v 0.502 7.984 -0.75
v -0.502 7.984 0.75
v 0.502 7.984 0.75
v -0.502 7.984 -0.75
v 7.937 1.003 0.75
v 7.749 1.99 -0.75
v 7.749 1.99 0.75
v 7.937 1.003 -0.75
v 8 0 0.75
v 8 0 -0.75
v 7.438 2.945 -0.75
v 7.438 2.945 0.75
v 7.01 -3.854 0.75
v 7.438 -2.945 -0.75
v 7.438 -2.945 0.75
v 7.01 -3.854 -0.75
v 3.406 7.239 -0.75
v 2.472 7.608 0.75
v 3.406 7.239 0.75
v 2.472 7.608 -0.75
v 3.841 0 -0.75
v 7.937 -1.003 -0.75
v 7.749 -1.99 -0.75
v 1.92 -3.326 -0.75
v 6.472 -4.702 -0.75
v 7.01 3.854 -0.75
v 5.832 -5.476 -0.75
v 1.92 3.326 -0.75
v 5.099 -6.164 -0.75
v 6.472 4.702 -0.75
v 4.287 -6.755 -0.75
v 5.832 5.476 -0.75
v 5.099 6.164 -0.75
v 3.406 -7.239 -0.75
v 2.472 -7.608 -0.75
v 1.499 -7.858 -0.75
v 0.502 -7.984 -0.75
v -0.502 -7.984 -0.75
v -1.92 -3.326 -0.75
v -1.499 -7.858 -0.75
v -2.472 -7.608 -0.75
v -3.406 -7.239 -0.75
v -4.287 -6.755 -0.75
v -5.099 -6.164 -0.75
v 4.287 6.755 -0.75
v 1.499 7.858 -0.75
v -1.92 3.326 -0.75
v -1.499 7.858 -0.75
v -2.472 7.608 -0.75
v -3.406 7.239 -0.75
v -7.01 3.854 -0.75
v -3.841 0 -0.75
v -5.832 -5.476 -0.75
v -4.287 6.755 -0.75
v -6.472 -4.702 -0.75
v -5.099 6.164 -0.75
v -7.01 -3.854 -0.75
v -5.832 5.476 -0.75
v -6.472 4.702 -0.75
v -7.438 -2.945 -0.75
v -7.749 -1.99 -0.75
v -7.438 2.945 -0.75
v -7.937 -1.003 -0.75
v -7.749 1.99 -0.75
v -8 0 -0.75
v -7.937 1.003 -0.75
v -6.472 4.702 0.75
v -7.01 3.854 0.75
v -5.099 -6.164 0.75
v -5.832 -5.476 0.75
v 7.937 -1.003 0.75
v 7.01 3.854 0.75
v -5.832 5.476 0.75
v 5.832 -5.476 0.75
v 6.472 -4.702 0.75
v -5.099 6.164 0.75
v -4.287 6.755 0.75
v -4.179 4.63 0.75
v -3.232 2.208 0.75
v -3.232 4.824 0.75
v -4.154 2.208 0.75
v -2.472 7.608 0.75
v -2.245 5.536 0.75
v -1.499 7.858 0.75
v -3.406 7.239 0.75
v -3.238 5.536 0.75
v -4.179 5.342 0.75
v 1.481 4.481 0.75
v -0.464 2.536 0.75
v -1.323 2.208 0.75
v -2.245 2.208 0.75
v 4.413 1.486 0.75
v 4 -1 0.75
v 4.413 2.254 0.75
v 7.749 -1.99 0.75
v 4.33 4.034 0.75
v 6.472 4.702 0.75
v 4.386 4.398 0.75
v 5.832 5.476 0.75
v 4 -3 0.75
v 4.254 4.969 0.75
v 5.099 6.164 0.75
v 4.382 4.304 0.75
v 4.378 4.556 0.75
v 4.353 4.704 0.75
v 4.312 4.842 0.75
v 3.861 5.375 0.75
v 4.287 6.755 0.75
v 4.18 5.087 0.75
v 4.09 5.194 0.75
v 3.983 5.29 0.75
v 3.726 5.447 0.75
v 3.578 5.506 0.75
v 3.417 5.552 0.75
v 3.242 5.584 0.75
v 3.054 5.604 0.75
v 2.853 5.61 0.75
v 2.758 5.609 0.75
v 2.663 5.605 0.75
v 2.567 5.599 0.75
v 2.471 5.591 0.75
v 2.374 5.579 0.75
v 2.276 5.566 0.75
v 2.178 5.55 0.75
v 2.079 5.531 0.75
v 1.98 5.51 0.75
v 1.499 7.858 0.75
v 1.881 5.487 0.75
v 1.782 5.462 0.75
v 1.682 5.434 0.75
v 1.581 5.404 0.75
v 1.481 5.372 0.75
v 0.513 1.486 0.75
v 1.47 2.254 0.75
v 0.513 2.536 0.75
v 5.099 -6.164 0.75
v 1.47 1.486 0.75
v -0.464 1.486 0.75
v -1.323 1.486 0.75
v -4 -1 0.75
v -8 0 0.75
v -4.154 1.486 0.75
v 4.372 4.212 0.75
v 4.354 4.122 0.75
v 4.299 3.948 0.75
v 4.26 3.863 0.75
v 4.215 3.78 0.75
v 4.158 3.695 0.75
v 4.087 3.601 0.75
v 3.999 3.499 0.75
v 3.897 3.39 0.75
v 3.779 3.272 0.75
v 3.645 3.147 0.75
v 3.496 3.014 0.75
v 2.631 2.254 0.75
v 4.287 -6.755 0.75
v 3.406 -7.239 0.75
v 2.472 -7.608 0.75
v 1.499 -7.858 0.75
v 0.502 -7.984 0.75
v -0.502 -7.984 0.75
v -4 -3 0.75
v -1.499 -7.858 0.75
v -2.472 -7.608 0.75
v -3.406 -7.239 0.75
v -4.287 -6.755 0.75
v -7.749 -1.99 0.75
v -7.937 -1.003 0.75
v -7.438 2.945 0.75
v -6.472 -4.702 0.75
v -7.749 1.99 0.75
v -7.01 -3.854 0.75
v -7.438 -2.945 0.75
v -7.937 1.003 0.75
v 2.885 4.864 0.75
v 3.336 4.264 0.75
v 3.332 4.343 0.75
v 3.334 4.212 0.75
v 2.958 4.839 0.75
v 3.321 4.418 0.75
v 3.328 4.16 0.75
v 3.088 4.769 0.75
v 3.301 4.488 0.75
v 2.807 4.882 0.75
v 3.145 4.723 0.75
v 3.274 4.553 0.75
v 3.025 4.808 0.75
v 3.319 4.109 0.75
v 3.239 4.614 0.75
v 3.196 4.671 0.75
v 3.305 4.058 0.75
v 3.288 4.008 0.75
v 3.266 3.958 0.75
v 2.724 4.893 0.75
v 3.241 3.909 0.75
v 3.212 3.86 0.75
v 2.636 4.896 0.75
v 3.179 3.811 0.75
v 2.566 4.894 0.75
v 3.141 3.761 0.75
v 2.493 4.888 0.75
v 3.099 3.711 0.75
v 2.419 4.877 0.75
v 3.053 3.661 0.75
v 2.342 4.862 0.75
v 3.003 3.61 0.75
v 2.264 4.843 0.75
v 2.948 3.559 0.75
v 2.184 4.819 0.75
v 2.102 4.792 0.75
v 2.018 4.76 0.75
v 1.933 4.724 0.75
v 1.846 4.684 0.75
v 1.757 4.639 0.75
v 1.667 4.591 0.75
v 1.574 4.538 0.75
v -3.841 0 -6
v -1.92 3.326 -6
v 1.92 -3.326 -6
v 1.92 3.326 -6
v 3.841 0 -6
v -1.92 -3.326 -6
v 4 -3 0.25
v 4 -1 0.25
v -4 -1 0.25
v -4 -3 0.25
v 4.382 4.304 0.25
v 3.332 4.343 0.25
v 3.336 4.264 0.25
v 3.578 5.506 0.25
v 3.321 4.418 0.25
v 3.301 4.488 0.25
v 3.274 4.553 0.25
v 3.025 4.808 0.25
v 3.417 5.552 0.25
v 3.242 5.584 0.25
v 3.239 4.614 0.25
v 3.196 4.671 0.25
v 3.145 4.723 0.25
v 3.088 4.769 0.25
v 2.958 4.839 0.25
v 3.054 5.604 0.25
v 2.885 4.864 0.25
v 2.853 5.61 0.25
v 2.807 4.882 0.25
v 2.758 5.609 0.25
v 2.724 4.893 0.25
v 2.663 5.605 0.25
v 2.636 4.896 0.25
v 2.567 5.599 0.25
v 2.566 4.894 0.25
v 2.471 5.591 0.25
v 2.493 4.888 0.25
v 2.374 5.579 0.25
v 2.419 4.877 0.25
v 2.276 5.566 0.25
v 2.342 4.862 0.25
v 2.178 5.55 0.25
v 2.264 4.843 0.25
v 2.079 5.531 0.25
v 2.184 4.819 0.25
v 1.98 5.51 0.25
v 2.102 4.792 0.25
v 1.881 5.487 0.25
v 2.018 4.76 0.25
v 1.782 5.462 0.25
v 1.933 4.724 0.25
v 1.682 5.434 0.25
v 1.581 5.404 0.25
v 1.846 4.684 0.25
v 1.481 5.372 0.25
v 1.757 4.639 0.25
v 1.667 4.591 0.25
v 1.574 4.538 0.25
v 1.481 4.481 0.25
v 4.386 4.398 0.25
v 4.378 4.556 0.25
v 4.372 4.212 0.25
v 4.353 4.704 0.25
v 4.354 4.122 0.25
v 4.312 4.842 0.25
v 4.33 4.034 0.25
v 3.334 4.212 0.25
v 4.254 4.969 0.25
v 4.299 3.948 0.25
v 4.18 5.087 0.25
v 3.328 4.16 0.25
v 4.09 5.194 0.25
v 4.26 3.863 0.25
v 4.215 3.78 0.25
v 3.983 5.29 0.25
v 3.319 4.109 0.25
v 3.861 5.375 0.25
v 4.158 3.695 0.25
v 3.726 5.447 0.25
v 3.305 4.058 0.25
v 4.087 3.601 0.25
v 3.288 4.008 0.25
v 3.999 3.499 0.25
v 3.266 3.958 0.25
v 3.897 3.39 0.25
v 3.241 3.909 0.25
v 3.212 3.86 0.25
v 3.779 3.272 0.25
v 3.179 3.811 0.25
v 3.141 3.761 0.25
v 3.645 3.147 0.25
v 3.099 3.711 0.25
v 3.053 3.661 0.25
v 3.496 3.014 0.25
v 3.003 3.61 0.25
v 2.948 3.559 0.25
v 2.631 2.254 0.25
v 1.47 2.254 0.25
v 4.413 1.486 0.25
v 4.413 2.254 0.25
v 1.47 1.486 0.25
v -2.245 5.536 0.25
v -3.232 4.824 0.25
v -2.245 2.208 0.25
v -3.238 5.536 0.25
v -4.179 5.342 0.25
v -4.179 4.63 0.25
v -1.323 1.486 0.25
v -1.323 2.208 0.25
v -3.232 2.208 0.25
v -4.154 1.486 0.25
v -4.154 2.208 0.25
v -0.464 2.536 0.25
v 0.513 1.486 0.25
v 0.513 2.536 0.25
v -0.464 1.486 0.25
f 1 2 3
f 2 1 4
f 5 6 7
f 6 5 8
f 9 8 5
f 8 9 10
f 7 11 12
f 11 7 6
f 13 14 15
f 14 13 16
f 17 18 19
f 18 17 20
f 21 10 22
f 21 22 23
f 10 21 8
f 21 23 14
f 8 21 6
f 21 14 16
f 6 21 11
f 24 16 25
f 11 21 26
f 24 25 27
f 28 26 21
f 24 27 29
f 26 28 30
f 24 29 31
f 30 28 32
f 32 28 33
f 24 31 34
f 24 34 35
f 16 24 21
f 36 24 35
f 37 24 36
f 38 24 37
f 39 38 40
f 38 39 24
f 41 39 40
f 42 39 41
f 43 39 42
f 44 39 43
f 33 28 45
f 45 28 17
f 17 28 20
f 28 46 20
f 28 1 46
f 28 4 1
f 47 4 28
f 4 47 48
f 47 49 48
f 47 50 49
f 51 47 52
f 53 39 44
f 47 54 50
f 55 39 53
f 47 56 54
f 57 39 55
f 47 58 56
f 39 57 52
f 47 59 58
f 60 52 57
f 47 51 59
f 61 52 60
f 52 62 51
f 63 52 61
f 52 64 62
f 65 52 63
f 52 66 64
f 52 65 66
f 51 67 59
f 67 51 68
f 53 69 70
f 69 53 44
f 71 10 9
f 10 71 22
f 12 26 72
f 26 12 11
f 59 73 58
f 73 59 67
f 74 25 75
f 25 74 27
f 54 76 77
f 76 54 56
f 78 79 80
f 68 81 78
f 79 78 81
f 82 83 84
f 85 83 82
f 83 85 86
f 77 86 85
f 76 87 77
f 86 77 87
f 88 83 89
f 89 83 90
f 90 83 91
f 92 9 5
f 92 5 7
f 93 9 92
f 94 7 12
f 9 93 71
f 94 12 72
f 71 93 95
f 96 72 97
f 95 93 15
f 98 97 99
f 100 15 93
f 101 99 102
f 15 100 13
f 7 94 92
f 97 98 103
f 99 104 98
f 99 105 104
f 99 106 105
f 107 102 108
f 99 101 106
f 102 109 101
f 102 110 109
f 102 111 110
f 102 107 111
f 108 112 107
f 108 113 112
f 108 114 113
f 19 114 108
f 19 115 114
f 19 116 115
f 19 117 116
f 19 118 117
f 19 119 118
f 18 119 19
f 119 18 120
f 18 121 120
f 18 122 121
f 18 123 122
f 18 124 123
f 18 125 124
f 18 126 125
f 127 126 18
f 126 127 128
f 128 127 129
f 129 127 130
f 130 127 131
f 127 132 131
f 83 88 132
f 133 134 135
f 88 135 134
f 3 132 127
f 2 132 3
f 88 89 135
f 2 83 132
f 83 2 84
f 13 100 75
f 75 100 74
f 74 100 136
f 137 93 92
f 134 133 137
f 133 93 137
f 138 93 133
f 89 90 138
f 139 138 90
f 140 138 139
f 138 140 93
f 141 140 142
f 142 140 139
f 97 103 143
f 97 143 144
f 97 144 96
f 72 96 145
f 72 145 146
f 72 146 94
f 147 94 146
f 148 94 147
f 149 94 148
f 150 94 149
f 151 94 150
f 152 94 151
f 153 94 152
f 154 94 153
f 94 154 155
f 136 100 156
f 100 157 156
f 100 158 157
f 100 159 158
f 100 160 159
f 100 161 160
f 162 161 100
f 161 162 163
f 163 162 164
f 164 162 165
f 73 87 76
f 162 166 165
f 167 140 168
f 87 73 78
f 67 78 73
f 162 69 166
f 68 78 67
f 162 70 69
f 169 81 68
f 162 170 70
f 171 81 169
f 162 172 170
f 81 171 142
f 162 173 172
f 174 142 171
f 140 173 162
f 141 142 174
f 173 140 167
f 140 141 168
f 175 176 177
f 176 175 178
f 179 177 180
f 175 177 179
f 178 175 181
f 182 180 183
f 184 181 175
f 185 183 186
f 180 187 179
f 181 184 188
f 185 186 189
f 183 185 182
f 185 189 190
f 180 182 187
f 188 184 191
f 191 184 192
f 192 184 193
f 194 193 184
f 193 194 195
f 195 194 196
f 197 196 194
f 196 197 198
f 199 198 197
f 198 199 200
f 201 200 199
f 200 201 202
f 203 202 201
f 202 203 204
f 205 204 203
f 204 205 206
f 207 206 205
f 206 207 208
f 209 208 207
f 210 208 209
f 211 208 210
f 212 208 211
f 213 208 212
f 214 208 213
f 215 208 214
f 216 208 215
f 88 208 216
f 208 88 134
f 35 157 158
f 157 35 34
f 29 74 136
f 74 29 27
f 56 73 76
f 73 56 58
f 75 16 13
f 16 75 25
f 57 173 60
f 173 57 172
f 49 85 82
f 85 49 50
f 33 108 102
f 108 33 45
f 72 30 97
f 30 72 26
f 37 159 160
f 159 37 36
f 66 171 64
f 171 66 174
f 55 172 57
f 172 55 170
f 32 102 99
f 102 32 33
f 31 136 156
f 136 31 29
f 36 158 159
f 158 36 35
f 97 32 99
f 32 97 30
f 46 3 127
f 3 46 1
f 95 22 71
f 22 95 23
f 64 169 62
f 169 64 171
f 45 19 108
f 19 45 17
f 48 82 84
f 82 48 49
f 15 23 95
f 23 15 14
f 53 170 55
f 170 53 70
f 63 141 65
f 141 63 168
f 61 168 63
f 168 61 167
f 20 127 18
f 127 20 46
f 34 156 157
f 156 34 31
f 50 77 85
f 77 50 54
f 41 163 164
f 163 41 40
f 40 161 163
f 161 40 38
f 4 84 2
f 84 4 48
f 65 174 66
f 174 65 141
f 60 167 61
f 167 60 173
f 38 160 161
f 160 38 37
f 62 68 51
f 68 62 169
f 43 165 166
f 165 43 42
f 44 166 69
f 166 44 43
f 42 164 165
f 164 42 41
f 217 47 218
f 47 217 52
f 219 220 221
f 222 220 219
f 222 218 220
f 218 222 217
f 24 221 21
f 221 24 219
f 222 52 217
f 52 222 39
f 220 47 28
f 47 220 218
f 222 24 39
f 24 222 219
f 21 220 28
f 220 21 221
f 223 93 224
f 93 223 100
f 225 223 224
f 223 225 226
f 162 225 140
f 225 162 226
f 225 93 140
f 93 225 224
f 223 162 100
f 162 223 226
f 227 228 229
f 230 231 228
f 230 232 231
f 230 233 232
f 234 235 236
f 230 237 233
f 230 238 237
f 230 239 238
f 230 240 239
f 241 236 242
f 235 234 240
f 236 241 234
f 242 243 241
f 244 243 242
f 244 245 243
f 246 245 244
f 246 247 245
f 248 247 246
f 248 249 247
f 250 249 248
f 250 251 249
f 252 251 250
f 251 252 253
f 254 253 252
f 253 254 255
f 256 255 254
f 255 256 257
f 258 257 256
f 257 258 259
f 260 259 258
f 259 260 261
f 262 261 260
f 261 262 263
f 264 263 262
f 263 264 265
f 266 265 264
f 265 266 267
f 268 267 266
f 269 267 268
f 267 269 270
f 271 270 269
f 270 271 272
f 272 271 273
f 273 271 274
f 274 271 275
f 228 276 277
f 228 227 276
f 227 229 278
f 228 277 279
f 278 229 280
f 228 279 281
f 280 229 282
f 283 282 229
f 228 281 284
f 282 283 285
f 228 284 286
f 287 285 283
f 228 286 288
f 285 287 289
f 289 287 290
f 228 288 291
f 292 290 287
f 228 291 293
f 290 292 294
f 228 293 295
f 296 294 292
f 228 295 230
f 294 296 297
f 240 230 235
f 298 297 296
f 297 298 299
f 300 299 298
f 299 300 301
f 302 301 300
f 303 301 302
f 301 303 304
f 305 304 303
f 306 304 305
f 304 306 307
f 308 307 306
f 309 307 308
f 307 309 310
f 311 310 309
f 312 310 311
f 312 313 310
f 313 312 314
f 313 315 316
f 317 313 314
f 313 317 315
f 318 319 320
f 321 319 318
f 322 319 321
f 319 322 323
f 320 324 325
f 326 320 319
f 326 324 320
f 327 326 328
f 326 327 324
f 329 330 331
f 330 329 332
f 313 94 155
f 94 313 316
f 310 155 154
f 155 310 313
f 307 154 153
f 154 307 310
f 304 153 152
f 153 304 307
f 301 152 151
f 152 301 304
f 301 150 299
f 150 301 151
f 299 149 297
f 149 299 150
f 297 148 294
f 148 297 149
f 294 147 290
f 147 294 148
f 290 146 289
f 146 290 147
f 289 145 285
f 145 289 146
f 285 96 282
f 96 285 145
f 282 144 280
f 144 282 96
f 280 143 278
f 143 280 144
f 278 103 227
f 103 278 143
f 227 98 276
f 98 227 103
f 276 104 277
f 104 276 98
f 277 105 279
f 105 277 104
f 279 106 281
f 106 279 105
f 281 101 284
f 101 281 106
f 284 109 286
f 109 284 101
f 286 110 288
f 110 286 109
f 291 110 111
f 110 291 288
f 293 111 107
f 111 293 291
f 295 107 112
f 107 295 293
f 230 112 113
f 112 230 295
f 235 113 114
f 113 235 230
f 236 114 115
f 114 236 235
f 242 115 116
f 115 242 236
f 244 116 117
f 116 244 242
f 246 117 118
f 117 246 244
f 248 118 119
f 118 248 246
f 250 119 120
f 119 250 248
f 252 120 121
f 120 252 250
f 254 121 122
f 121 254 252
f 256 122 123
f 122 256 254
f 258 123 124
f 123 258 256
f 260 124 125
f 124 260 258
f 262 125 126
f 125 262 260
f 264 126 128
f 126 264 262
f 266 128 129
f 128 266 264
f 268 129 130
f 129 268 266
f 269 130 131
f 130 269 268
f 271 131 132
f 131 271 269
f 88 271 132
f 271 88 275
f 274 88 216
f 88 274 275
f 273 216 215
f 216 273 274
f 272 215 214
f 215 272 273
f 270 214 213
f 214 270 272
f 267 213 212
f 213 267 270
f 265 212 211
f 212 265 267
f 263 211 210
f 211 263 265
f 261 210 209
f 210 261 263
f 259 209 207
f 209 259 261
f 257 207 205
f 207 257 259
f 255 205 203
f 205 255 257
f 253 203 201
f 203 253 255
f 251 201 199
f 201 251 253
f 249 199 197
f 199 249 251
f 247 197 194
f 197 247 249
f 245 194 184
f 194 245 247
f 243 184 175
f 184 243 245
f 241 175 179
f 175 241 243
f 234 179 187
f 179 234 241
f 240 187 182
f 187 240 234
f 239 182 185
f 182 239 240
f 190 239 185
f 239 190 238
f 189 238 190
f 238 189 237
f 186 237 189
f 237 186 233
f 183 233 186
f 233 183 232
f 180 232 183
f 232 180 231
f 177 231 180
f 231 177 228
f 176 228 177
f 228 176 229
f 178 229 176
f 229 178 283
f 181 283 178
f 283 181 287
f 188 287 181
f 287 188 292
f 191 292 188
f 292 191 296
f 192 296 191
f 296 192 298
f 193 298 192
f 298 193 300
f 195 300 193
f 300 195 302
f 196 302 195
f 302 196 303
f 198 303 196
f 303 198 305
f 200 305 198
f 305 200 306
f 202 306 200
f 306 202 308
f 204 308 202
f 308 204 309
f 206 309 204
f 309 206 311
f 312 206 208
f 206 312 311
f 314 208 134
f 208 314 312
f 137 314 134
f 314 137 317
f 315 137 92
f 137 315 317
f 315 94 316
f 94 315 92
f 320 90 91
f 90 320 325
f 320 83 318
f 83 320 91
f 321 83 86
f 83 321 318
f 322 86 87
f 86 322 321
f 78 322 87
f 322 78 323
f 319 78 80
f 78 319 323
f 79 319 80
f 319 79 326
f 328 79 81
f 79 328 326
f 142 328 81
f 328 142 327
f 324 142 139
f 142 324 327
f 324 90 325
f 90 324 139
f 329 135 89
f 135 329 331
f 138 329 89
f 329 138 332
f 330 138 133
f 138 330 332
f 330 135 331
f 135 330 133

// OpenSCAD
$fn = 50;


difference() {
	union() {
		translate(v = [0, 0, -0.7500000000]) {
			cylinder(h = 1.5000000000, r = 8.0000000000);
		}
		translate(v = [0, 0, -6]) {
			linear_extrude(height = 6) {
				polygon(points = [[3.8408550000, 0.0000000000], [1.9204275000, 3.3262780023], [-1.9204275000, 3.3262780023], [-3.8408550000, 0.0000000000], [-1.9204275000, -3.3262780023], [1.9204275000, -3.3262780023]]);
			}
		}
	}
	union() {
		#translate(v = [-4.0000000000, -3.0000000000, 0.2500000000]) {
			cube(size = [8, 2, 0.5000000000]);
		}
		#translate(v = [0, 3.5000000000, 0.2500000000]) {
			linear_extrude(height = 0.5000000000) {
				text(font = "SegoiUI:Bold", halign = "center", size = 4, text = "1.2", valign = "center");
			}
		}
	}
}
